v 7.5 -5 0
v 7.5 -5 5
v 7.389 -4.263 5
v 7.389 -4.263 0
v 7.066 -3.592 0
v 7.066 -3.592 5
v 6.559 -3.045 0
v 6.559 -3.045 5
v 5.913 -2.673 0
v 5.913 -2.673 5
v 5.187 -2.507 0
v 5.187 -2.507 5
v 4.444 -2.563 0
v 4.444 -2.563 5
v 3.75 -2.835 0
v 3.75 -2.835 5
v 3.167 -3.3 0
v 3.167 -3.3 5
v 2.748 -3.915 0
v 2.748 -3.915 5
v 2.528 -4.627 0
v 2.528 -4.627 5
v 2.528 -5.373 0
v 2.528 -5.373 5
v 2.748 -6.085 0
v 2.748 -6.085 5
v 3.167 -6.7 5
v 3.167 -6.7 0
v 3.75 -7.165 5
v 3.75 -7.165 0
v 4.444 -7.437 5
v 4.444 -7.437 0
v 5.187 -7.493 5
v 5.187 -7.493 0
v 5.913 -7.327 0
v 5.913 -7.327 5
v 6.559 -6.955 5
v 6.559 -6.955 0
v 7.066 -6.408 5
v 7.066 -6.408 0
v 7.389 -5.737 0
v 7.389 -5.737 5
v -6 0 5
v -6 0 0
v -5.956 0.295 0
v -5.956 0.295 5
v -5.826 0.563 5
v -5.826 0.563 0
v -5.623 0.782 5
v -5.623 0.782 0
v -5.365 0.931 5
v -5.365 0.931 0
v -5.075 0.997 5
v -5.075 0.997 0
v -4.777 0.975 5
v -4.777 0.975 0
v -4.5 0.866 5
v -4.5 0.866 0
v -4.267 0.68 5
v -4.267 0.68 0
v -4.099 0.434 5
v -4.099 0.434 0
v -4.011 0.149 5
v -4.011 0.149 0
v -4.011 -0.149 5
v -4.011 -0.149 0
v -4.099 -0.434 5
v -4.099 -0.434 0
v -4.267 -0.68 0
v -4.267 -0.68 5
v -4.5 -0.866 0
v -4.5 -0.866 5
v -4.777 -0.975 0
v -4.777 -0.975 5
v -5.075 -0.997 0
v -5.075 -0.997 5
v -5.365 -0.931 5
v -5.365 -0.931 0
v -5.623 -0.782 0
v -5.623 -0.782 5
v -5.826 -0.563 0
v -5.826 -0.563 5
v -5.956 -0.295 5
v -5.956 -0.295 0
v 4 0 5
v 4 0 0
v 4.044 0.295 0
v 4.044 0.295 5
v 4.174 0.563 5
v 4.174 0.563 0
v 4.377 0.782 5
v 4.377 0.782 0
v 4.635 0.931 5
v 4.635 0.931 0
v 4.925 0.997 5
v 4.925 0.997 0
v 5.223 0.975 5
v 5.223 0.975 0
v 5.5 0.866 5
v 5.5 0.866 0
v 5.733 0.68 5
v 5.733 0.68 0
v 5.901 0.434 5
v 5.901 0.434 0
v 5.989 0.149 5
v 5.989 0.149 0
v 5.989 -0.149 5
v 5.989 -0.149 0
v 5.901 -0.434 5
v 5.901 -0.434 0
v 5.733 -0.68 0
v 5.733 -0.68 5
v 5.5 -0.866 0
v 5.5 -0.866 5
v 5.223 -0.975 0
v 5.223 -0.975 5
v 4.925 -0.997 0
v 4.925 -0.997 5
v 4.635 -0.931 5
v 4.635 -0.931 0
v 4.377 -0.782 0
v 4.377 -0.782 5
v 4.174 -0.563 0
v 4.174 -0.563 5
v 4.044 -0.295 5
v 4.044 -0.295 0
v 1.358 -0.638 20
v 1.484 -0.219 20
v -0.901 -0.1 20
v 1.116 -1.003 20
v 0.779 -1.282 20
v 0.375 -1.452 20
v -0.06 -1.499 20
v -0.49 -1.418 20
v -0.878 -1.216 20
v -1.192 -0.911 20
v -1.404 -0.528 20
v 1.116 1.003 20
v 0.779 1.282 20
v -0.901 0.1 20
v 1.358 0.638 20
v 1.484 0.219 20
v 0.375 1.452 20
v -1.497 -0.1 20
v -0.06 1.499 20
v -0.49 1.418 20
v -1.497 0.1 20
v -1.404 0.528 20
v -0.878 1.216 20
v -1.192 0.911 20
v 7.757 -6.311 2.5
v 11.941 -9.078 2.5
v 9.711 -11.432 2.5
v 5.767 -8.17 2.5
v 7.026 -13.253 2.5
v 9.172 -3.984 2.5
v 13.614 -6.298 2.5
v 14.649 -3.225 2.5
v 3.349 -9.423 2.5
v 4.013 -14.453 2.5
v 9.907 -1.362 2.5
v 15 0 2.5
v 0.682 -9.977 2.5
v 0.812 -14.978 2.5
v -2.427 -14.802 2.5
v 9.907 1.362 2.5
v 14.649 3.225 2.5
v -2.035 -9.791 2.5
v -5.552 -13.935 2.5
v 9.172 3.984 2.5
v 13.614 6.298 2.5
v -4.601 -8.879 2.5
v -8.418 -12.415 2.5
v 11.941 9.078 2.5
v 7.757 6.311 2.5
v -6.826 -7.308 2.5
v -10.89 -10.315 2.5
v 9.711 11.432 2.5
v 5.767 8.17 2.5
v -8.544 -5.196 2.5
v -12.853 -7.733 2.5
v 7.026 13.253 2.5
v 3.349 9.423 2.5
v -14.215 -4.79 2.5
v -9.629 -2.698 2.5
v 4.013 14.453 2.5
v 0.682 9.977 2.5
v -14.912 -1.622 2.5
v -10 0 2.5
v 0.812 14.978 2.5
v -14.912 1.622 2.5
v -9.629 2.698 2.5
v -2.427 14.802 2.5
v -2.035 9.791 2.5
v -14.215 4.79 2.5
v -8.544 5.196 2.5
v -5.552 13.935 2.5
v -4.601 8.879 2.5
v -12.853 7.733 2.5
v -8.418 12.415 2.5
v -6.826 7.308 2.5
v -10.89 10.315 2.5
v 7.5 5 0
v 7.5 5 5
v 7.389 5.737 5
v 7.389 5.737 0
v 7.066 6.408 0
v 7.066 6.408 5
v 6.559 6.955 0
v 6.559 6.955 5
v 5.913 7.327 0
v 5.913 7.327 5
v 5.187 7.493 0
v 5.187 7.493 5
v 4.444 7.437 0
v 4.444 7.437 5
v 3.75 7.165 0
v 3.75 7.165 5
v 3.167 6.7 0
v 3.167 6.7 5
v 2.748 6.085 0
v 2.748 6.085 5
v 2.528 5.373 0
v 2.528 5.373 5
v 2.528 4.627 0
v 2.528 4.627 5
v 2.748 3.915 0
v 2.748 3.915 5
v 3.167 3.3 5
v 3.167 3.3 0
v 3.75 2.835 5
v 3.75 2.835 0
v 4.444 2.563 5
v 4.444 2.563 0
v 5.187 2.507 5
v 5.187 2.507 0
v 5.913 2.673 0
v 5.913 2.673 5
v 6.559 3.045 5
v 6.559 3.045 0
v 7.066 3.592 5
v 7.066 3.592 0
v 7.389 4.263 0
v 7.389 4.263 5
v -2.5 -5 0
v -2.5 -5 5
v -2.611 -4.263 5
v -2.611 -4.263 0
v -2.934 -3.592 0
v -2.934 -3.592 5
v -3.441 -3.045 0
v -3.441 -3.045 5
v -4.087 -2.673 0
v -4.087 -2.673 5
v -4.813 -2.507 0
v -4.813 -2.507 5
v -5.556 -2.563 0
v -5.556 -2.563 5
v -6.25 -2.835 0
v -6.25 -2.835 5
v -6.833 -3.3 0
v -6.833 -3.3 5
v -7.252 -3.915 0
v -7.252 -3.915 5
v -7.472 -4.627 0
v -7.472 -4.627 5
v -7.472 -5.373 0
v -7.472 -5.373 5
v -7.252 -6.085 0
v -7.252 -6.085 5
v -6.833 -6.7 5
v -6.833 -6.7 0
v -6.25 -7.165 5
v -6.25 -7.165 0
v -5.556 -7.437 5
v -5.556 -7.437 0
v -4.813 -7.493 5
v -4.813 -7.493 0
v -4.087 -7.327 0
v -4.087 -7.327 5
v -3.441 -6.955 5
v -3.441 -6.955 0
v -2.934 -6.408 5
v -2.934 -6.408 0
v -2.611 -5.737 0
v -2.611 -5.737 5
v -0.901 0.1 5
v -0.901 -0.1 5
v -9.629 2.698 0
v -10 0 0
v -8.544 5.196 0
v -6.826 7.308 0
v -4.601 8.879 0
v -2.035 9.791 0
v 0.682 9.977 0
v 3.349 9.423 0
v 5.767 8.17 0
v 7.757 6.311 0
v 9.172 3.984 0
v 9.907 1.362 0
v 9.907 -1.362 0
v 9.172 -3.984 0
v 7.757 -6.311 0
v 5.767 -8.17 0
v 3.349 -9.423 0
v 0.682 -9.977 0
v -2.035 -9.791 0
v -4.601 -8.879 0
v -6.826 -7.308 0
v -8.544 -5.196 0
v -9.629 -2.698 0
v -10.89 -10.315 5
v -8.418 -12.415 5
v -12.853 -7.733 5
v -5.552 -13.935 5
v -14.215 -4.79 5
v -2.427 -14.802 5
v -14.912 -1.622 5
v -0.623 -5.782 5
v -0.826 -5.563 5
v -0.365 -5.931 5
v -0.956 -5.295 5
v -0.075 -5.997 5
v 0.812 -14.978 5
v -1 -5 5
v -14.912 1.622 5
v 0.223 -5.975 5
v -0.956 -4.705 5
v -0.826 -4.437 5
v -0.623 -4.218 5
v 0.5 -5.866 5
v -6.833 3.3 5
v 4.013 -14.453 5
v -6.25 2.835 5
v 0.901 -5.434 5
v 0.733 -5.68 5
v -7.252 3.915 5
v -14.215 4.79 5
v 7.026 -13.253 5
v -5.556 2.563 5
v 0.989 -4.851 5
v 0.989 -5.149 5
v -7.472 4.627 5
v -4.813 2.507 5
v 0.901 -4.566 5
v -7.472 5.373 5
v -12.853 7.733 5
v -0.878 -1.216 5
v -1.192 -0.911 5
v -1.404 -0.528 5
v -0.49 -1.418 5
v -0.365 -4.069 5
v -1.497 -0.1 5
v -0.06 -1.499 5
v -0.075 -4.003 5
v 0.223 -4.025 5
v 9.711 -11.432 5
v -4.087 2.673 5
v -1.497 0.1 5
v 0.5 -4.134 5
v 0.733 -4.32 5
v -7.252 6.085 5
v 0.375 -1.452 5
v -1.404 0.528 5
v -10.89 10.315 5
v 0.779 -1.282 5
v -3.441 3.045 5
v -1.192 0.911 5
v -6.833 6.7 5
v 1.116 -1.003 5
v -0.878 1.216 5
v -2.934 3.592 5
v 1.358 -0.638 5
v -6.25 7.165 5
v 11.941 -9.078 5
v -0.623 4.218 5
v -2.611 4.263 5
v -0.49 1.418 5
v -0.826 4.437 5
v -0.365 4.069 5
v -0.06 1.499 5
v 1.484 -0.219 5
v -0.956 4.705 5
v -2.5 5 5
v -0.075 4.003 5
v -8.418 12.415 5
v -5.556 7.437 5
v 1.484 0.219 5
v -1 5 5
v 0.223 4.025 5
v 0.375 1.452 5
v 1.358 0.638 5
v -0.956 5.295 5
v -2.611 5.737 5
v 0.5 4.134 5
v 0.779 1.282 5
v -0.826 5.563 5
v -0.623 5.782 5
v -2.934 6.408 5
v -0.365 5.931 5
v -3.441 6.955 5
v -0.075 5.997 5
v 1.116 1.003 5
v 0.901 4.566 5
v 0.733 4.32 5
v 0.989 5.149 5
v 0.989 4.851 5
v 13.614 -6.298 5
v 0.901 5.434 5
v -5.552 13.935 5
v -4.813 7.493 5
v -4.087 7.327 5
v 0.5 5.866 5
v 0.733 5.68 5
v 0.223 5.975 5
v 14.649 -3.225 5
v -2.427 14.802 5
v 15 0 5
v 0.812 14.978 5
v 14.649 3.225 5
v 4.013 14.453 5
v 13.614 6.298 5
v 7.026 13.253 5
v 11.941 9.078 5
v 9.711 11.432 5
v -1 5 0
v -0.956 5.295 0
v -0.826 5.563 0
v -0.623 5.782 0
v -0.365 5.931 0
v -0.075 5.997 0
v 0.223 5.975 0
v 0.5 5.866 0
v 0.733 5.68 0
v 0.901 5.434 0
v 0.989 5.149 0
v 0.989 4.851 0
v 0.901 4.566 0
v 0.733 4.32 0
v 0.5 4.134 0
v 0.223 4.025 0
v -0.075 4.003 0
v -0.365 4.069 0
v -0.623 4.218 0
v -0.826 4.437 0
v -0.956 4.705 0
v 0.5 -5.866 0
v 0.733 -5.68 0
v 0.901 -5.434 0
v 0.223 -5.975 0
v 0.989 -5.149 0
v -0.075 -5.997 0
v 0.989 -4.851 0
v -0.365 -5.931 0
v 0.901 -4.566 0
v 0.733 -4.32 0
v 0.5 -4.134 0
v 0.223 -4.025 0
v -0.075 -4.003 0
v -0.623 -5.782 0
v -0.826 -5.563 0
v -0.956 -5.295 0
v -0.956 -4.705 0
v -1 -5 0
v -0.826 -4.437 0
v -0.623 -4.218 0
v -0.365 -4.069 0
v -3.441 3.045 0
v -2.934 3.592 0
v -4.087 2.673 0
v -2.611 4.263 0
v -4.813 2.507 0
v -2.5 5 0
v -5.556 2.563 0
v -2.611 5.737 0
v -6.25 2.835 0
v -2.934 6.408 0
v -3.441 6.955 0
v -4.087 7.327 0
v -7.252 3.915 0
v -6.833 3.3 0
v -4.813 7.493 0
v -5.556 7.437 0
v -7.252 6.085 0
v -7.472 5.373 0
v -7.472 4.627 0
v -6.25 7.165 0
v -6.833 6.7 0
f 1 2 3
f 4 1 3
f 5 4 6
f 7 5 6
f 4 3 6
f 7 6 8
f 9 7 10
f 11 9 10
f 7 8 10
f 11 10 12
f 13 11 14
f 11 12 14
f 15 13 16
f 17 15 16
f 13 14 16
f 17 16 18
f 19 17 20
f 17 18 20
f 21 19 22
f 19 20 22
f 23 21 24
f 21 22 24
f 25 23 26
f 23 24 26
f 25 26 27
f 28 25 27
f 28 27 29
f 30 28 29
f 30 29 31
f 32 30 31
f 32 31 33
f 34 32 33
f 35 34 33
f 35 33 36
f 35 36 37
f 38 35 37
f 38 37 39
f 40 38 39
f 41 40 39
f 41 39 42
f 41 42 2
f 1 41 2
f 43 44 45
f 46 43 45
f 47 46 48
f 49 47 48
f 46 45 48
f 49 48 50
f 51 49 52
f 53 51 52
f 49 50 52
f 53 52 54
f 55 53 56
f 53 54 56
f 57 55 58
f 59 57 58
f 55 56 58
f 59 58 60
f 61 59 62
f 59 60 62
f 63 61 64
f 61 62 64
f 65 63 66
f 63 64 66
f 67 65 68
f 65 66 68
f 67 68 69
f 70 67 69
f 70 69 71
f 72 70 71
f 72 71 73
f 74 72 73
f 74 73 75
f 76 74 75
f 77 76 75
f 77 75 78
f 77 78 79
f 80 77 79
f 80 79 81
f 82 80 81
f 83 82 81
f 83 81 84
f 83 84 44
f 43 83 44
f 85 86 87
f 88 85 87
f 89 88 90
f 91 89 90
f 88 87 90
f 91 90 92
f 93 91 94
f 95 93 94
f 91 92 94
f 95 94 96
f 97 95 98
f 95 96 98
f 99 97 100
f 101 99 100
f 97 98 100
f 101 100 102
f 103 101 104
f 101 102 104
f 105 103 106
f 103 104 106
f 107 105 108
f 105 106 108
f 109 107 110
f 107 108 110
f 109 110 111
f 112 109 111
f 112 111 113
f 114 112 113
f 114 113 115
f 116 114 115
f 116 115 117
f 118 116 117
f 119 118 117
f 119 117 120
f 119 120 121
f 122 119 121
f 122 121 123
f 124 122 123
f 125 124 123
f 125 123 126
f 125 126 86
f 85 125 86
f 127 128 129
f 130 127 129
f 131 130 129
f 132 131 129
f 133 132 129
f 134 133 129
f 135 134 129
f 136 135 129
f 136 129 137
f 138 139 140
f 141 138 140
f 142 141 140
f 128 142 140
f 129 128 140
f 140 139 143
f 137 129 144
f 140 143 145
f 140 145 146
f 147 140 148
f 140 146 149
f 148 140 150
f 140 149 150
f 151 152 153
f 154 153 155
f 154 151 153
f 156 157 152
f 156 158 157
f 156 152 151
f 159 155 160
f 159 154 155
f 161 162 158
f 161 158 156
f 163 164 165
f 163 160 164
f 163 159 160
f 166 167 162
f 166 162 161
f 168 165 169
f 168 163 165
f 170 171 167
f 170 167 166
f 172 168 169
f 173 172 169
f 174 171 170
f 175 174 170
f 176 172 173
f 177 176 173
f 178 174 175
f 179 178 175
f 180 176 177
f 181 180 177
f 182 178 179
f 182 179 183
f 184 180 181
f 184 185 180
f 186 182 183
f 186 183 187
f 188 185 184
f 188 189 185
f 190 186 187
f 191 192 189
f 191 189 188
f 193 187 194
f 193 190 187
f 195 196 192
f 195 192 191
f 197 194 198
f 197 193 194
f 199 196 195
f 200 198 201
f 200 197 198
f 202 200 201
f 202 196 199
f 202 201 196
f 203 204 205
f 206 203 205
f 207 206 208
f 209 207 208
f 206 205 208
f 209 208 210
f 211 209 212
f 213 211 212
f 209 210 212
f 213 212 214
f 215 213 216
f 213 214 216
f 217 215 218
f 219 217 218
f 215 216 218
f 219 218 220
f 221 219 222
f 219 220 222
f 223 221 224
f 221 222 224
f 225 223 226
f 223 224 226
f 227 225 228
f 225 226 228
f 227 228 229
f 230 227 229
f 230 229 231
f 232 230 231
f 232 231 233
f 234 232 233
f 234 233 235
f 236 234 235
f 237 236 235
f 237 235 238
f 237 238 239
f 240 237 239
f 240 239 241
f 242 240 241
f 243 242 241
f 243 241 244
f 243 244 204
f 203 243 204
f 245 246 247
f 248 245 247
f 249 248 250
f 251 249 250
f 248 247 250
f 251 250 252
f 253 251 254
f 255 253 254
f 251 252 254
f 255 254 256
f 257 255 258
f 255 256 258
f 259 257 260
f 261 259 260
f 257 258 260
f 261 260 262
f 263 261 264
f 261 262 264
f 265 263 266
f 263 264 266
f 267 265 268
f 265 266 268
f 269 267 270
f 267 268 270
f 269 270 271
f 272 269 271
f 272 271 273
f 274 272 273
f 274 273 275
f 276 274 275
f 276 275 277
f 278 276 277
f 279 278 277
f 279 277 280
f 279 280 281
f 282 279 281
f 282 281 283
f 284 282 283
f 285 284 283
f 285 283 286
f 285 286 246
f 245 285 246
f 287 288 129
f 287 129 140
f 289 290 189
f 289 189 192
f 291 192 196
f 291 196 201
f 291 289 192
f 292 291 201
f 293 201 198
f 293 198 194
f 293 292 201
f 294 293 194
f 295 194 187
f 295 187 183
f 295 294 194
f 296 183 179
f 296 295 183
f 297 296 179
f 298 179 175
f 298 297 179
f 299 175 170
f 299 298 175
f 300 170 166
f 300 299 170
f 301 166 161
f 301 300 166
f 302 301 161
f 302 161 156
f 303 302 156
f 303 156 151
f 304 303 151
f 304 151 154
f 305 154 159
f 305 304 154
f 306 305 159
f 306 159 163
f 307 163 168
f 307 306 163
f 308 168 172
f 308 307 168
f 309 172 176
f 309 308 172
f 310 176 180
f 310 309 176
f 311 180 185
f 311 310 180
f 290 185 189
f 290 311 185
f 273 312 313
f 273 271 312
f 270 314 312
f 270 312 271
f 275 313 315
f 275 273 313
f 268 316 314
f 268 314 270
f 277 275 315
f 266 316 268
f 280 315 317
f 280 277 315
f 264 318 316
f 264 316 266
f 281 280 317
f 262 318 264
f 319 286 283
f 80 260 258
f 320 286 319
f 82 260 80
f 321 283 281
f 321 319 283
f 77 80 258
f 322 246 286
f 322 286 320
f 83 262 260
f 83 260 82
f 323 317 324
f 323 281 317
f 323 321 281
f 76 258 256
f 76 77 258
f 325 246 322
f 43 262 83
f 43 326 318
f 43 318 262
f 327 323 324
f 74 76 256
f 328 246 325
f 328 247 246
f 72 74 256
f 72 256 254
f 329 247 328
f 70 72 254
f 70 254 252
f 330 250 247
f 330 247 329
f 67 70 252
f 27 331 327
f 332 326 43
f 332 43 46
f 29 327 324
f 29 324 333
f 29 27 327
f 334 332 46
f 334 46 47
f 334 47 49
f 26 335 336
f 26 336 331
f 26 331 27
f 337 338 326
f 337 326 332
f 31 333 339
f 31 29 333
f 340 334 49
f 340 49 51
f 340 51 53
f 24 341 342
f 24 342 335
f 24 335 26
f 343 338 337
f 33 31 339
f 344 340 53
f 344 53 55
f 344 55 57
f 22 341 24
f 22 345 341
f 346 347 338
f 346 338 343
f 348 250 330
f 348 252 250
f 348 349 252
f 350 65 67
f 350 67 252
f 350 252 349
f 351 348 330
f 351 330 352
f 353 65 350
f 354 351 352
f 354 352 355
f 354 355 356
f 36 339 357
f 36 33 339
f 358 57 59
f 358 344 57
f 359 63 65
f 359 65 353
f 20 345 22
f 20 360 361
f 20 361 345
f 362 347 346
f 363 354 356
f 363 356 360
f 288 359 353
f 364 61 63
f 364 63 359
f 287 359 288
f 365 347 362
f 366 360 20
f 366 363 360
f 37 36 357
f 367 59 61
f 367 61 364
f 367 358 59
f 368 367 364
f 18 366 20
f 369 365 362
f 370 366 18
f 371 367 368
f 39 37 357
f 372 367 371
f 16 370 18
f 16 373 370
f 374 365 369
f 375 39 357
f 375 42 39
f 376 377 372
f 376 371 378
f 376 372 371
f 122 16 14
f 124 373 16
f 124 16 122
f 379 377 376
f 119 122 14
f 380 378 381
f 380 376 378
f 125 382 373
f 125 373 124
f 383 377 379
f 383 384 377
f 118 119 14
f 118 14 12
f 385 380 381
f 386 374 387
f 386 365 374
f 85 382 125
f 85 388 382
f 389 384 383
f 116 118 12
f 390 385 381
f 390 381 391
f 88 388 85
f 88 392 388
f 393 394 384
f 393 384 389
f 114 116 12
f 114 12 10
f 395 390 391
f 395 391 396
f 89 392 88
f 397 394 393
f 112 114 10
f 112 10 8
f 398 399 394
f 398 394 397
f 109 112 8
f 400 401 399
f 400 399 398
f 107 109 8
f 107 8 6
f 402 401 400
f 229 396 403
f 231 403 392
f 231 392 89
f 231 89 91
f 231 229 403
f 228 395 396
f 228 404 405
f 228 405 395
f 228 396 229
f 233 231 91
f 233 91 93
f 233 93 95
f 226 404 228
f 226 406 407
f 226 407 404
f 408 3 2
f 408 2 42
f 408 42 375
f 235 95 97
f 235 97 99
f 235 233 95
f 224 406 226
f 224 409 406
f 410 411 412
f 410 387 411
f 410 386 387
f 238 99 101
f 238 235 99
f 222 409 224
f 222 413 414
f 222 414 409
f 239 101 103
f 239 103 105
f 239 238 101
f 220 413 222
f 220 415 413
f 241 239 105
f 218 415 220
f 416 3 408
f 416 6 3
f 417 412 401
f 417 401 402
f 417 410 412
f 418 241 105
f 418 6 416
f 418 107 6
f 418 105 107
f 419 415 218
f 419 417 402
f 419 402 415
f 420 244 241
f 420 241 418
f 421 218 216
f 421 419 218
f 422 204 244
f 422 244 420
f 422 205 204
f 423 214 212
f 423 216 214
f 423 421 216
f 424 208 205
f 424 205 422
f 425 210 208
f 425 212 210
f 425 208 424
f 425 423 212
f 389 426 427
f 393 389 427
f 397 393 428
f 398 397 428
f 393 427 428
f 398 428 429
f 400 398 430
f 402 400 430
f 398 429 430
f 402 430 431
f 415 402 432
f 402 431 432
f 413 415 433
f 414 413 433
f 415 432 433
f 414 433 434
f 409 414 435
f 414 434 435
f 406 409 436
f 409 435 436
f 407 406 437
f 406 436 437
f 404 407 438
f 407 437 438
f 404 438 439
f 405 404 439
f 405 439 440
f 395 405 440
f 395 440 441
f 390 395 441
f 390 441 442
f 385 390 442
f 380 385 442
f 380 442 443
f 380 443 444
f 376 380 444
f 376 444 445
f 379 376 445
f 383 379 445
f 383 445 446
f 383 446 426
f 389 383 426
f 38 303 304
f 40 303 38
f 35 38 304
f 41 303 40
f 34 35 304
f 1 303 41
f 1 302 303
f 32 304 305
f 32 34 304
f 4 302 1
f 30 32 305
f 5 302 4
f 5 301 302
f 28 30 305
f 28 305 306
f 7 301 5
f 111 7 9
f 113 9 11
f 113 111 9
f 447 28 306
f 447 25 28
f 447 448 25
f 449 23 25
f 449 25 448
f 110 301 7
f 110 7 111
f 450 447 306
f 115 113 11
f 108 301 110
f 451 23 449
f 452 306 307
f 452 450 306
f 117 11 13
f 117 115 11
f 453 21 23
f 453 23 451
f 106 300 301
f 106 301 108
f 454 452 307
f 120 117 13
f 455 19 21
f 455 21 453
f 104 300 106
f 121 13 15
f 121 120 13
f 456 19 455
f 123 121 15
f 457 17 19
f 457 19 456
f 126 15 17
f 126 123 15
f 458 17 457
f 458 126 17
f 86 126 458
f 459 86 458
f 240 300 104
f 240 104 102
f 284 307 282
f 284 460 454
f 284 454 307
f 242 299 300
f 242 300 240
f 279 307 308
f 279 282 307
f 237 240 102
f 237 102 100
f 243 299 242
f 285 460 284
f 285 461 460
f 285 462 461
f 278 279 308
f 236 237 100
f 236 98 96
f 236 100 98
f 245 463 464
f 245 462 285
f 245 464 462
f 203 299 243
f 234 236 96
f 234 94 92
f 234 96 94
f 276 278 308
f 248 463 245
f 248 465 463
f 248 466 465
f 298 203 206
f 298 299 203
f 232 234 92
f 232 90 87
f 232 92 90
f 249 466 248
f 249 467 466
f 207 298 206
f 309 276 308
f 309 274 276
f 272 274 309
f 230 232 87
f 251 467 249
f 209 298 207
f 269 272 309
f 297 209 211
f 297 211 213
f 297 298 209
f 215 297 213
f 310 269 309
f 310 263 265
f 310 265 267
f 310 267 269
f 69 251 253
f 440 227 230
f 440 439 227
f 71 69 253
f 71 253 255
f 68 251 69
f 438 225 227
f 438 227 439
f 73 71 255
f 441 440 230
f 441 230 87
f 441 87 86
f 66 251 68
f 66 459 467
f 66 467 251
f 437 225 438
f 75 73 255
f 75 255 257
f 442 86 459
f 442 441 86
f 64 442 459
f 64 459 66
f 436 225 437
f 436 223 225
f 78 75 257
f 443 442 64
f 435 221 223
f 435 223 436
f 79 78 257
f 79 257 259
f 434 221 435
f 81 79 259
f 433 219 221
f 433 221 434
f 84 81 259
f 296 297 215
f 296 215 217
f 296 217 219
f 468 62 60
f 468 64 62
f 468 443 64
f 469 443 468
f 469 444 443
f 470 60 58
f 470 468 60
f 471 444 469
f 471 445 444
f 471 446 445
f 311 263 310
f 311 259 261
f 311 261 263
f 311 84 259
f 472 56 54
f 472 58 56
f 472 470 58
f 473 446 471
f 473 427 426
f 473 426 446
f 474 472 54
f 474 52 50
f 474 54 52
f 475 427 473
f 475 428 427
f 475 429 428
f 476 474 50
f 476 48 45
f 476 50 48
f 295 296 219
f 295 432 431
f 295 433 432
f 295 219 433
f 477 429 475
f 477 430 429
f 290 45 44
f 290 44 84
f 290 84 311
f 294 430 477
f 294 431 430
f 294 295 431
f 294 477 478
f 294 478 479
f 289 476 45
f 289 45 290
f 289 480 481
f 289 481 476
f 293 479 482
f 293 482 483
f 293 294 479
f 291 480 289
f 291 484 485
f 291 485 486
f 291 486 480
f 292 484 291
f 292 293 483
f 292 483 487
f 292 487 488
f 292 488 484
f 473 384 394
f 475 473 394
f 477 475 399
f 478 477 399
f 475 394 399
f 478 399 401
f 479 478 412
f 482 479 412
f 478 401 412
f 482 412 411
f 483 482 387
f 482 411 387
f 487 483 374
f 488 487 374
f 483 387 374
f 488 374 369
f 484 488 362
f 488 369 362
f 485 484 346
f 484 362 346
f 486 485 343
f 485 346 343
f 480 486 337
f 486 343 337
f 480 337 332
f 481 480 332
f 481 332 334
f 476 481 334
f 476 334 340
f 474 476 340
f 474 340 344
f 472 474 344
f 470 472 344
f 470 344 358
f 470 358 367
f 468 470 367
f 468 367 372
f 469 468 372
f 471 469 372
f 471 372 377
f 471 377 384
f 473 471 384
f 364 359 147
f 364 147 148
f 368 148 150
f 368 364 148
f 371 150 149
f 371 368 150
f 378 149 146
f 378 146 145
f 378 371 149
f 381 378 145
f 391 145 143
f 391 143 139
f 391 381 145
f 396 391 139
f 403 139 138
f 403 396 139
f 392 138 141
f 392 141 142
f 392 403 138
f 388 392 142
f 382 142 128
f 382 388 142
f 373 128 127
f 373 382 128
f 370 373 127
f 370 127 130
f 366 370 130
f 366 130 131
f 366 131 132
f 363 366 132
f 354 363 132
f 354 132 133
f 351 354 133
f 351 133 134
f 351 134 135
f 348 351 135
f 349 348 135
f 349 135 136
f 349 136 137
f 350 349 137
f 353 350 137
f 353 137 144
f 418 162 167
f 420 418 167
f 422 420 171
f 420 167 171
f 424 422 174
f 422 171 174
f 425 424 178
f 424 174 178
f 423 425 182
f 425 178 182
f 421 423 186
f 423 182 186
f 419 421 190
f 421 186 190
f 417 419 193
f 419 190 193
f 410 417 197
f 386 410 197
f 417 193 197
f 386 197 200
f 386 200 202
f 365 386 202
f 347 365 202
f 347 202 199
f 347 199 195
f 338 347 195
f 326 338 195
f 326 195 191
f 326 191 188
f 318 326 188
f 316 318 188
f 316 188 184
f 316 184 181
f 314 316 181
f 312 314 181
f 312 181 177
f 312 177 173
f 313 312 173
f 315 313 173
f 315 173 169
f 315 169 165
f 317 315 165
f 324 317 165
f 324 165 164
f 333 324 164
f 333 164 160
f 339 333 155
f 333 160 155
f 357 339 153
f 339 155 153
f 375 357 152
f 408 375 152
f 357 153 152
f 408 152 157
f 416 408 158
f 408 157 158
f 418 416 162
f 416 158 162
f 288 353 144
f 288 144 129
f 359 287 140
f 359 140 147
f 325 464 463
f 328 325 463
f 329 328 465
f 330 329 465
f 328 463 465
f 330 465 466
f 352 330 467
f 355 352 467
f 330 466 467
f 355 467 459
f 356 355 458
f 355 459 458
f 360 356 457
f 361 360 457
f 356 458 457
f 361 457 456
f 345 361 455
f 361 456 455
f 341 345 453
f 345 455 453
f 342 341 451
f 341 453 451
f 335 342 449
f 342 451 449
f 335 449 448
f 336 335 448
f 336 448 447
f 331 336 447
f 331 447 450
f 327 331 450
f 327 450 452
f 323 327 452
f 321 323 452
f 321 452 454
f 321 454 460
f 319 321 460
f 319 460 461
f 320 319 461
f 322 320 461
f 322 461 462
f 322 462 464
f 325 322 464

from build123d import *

# Parameters (mm, degrees)
SKETCH1_R              = 15
BODY_DEPTH             = 5
SKETCH2_R              = 15
SKETCH2_R_2            = 10
SLEW_BEARING_LIP_DEPTH = 2.5
SKETCH3_R              = 2.5
CUT_EXTRUDE2_DEPTH     = 22.794494718
BOSS_EXTRUDE1_DEPTH    = 20
SKETCH5_R              = 1
CUT_EXTRUDE3_DEPTH     = 30.154759474


with BuildPart() as part:
    # Sketch1 → body (new body)
    with BuildSketch(Plane.XY):
        Circle(SKETCH1_R)
    extrude(amount=BODY_DEPTH)

    # Sketch2 → slew bearing lip (cut)
    with BuildSketch(Plane(origin=(0, 0, 0), x_dir=(-1, 0, 0), z_dir=(0, 0, -1))):
        Circle(SKETCH2_R)
        Circle(SKETCH2_R_2, mode=Mode.SUBTRACT)
    extrude(amount=-SLEW_BEARING_LIP_DEPTH, mode=Mode.SUBTRACT)

    # Sketch3 → Cut-Extrude2 (cut, through all)
    with BuildSketch(Plane.XY.offset(5)):
        with Locations((-5, 5)):
            Circle(SKETCH3_R)
        with Locations((5, 5)):
            Circle(SKETCH3_R)
        with Locations((5, -5)):
            Circle(SKETCH3_R)
        with Locations((-5, -5)):
            Circle(SKETCH3_R)
    extrude(amount=-CUT_EXTRUDE2_DEPTH, mode=Mode.SUBTRACT)

    # Sketch4 → Boss-Extrude1 (add)
    with BuildSketch(Plane(origin=(0, 0, 0), x_dir=(-1, 0, 0), z_dir=(0, 0, -1))):
        with BuildLine():
            Line((0.90103413, 0.1), (1.496662955, 0.1))
            ThreePointArc((1.496662955, 0.1), (-1.5, 0), (1.496662955, -0.1))
            Line((1.496662955, -0.1), (0.90103413, -0.1))
            Line((0.90103413, -0.1), (0.90103413, 0.1))
        make_face()
    extrude(amount=-BOSS_EXTRUDE1_DEPTH)

    # Sketch5 → Cut-Extrude3 (cut, through all)
    with BuildSketch(Plane(origin=(0, 0, 0), x_dir=(-1, 0, 0), z_dir=(0, 0, -1))):
        with Locations((0, 5)):
            Circle(SKETCH5_R)
        with Locations((5, 0)):
            Circle(SKETCH5_R)
        with Locations((0, -5)):
            Circle(SKETCH5_R)
        with Locations((-5, 0)):
            Circle(SKETCH5_R)
    extrude(amount=-CUT_EXTRUDE3_DEPTH, mode=Mode.SUBTRACT)


solid = part.part
